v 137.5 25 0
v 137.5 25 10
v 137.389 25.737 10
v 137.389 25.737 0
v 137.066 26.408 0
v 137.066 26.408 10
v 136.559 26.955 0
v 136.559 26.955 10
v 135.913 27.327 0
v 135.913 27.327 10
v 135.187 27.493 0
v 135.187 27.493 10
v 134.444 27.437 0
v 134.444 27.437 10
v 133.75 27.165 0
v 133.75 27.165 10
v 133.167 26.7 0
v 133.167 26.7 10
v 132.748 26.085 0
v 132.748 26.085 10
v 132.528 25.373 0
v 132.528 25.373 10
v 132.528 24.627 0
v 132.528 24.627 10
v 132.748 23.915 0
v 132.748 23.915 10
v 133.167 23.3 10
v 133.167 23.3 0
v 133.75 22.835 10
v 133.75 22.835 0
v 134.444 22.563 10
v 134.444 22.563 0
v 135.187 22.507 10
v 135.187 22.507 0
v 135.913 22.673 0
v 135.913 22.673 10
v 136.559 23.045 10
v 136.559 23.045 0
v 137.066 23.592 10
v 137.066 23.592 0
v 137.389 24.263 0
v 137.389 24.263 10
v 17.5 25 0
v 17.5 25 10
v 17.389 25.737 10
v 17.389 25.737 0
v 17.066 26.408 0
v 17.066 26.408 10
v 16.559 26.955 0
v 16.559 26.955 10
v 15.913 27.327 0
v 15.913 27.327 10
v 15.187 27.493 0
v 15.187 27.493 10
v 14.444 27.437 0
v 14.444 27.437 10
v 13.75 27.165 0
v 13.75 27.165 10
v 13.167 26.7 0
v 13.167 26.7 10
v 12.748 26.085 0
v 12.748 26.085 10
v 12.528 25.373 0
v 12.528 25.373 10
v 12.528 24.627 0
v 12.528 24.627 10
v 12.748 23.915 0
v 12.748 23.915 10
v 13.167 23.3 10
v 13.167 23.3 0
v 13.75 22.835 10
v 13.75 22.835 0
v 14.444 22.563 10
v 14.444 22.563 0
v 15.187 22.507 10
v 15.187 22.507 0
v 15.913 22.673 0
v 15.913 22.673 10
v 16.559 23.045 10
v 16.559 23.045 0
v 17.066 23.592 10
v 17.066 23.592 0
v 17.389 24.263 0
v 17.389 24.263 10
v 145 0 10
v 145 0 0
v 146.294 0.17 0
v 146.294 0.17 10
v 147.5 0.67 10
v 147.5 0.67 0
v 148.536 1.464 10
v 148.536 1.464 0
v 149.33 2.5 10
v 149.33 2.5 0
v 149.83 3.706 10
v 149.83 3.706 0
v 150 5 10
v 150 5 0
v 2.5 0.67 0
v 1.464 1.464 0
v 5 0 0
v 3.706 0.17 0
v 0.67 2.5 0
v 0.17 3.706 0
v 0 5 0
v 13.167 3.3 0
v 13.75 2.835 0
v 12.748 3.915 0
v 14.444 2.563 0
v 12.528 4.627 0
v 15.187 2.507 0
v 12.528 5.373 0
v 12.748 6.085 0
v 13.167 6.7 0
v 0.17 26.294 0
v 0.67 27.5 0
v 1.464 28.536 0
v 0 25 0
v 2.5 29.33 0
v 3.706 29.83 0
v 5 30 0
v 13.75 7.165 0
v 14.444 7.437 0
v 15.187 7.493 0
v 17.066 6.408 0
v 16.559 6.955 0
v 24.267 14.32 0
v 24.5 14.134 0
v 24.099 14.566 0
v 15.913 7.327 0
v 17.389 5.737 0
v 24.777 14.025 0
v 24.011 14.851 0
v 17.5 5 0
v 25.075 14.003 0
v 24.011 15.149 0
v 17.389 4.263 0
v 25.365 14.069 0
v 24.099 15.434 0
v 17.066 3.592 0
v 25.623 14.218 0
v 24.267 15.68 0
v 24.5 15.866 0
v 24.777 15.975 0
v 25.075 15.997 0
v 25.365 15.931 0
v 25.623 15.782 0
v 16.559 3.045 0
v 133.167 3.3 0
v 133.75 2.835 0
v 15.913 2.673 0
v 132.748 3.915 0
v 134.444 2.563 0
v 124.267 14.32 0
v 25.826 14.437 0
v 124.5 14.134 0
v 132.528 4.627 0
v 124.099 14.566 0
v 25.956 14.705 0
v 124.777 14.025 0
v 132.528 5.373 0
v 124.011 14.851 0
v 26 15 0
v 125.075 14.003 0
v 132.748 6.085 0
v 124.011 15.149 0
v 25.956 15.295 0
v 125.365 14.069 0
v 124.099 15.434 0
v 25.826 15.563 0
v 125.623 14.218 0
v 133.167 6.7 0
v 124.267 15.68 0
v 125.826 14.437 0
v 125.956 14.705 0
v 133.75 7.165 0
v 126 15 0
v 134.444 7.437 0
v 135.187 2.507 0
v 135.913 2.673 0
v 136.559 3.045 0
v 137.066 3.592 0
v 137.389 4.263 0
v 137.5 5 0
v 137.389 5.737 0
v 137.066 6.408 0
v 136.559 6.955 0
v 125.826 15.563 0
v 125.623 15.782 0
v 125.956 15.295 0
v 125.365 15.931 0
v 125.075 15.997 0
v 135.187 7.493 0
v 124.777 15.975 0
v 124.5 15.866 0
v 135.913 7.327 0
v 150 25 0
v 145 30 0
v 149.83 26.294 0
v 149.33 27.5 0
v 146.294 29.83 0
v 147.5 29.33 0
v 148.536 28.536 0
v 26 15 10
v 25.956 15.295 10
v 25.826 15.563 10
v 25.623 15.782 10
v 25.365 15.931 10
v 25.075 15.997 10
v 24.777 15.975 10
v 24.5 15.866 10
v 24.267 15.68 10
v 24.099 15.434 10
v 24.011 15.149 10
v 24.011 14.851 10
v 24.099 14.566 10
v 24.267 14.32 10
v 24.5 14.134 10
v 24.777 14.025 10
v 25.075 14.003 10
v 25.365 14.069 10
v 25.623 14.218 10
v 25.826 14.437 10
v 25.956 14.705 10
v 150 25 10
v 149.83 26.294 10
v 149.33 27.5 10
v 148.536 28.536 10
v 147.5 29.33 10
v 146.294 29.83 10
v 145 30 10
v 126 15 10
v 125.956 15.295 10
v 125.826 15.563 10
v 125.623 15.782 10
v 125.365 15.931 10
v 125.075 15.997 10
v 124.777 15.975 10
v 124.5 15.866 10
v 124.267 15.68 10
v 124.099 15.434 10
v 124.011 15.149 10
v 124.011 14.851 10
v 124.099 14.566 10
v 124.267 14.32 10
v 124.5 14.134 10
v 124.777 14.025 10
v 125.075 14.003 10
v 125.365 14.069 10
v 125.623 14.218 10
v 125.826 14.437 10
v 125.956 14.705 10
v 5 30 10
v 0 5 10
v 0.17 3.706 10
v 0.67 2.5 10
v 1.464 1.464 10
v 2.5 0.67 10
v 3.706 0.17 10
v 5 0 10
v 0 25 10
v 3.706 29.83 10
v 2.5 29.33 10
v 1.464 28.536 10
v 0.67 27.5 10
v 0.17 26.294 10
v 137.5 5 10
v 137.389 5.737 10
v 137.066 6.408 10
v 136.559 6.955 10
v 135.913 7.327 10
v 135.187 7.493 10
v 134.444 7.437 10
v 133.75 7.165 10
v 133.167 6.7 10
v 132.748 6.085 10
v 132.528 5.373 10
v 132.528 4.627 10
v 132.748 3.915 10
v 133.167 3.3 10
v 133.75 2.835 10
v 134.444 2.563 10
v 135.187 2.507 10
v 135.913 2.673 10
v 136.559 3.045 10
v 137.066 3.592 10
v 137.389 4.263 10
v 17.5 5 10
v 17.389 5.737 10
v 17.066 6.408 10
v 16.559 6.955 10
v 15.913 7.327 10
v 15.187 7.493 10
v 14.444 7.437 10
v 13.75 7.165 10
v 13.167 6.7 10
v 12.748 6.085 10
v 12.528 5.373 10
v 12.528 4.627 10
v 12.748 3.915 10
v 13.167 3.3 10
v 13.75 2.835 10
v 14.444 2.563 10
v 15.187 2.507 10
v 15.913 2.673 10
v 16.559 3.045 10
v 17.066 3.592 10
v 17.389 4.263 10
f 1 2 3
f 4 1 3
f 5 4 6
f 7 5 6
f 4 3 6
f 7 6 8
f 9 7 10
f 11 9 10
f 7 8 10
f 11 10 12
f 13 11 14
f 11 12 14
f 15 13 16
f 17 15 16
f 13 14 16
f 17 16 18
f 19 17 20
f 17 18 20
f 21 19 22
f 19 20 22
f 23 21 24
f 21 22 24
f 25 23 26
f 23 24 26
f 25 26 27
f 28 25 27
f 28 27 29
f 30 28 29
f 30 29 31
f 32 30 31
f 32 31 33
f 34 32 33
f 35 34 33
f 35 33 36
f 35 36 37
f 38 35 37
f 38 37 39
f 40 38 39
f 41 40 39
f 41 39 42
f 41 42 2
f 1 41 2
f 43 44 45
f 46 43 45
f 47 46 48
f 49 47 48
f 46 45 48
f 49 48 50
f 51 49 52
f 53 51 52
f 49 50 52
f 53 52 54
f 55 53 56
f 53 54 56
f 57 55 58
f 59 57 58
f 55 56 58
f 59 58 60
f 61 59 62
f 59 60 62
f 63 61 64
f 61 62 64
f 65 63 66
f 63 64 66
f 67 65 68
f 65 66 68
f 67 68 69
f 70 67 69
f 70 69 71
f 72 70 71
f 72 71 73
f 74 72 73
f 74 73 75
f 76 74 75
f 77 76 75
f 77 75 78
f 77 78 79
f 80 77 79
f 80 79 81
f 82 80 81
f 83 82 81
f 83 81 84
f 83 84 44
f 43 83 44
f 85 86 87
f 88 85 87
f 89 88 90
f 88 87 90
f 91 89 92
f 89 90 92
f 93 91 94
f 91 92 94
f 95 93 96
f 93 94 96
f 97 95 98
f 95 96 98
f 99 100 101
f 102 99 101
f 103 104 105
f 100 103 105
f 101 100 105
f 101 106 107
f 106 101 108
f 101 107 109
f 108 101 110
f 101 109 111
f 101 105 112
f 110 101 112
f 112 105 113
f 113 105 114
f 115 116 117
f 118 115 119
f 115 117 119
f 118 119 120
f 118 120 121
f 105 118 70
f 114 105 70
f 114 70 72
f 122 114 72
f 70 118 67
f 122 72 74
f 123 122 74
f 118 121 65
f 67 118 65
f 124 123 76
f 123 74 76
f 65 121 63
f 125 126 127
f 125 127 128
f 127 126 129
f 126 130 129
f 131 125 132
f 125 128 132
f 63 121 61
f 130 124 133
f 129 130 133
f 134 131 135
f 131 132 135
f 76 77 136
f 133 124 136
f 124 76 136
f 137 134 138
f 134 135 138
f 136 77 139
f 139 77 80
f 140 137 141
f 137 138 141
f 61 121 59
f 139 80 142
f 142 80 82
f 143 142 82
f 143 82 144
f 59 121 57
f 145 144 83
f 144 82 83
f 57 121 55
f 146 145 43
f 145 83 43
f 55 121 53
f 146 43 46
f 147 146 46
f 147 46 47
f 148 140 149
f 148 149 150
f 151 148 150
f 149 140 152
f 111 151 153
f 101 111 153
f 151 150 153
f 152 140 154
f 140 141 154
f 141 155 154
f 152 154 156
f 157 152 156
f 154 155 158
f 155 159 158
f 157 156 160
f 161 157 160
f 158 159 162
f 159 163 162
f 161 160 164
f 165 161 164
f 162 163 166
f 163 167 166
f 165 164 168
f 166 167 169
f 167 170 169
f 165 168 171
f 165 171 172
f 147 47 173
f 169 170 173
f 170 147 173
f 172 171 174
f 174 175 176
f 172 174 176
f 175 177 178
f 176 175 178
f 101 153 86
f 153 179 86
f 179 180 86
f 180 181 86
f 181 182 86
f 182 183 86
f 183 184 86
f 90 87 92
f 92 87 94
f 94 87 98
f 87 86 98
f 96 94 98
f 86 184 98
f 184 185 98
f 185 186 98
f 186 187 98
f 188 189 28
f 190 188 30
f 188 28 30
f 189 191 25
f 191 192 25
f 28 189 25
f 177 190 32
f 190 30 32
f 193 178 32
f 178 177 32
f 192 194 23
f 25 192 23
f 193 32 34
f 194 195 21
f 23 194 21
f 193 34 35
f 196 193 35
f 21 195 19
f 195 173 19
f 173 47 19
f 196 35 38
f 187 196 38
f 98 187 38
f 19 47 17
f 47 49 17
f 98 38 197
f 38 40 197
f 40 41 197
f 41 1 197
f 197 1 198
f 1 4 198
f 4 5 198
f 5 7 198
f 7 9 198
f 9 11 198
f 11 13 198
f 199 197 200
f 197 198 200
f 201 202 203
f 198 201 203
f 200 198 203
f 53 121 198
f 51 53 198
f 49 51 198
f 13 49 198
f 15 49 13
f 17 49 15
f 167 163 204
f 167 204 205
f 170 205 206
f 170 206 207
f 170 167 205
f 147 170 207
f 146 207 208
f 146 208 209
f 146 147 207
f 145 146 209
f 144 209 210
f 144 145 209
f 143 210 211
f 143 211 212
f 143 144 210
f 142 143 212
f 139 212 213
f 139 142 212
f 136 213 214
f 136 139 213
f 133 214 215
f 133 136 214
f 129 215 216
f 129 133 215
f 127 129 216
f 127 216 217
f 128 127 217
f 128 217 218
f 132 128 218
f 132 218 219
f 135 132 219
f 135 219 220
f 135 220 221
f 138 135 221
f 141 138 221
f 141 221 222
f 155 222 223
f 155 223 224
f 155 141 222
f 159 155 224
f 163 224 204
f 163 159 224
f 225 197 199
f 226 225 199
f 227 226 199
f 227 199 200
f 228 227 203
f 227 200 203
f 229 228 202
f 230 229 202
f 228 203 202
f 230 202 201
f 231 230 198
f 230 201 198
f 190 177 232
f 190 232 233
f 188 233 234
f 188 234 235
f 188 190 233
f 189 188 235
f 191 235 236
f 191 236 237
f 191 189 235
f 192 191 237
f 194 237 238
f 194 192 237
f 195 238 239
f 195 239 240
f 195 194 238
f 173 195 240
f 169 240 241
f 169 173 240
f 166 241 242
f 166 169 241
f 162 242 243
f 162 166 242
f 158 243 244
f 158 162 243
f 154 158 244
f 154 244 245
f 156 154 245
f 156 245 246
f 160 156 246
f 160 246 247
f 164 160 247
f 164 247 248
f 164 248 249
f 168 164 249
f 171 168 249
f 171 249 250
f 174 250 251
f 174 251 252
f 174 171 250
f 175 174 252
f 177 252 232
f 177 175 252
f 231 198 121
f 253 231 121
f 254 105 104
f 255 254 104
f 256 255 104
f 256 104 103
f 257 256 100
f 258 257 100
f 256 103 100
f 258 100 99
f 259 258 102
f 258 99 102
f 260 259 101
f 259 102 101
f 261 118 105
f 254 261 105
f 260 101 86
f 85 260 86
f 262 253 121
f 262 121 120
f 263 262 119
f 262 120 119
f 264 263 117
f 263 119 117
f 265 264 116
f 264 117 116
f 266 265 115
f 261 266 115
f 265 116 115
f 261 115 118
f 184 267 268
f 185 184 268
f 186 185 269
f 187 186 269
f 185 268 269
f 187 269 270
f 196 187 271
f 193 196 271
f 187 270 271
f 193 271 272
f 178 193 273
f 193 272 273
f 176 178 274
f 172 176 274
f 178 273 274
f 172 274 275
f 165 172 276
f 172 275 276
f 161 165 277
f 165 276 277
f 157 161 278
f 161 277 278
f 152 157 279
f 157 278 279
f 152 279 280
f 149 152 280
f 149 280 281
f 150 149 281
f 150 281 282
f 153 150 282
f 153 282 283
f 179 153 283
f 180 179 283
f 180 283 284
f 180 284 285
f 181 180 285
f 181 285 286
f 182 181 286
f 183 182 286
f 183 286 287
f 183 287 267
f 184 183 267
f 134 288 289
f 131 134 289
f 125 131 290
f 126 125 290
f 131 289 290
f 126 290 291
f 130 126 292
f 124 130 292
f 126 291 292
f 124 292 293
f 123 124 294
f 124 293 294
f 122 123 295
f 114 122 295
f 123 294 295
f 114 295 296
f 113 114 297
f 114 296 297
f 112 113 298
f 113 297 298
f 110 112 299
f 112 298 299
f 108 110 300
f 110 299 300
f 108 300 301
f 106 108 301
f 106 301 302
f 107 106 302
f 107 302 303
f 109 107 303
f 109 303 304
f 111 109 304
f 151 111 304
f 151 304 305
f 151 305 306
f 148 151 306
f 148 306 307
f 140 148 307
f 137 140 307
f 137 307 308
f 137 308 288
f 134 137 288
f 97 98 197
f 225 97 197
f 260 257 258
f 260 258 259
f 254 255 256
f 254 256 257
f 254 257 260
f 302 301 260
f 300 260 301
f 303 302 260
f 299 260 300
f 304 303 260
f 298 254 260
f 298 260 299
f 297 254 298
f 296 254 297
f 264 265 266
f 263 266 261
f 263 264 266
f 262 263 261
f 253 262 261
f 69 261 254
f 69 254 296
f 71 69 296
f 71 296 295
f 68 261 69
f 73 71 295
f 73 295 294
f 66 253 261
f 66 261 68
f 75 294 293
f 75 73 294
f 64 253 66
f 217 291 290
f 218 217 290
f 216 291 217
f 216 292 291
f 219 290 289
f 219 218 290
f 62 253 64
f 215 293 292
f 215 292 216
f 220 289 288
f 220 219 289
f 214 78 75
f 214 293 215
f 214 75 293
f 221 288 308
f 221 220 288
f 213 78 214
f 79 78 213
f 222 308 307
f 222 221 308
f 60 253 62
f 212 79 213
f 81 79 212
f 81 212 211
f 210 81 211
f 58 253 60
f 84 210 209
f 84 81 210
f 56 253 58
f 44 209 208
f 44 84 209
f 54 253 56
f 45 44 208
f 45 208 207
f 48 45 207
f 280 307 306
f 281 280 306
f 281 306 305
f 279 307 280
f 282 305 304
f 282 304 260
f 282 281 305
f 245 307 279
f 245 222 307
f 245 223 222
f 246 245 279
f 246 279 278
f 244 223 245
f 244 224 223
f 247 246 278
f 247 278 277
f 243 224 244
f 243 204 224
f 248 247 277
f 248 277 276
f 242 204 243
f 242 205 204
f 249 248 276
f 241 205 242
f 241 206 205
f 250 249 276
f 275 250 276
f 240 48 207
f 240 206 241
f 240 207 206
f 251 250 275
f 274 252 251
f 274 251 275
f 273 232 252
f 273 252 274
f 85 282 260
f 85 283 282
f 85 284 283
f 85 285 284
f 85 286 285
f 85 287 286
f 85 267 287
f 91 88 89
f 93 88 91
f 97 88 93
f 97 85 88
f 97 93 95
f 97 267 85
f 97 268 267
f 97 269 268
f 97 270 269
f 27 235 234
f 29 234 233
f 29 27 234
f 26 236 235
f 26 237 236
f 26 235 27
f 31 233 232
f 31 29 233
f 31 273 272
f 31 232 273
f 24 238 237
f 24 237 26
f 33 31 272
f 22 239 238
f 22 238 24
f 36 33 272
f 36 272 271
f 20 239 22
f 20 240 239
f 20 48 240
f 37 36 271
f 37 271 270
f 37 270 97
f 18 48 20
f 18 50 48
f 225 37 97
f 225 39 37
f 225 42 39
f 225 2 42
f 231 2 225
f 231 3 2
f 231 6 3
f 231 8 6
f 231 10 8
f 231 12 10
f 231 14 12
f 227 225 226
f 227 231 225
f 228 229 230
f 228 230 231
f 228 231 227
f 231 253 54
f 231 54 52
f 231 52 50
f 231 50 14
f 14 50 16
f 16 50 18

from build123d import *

# Parameters (mm, degrees)
SKETCH1_R           = 1
BOSS_EXTRUDE1_DEPTH = 10
SKETCH2_R           = 2.5
CUT_EXTRUDE1_DEPTH  = 11


with BuildPart() as part:
    # Sketch1 → Boss-Extrude1 (new body)
    with BuildSketch(Plane.XY):
        with BuildLine():
            Line((5, 0), (145, 0))
            ThreePointArc((145, 0), (148.535533906, 1.464466094), (150, 5))
            Line((150, 5), (150, 25))
            ThreePointArc((150, 25), (148.535533906, 28.535533906), (145, 30))
            Line((145, 30), (5, 30))
            ThreePointArc((5, 30), (1.464466094, 28.535533906), (0, 25))
            Line((0, 25), (0, 5))
            ThreePointArc((0, 5), (1.464466094, 1.464466094), (5, 0))
        make_face()
        with Locations((25, 15)):
            Circle(SKETCH1_R, mode=Mode.SUBTRACT)
        with Locations((125, 15)):
            Circle(SKETCH1_R, mode=Mode.SUBTRACT)
    extrude(amount=BOSS_EXTRUDE1_DEPTH)

    # Sketch2 → Cut-Extrude1 (cut, through all)
    with BuildSketch(Plane.XY.offset(10)):
        with Locations((15, 25)):
            Circle(SKETCH2_R)
        with Locations((15, 5)):
            Circle(SKETCH2_R)
        with Locations((135, 25)):
            Circle(SKETCH2_R)
        with Locations((135, 5)):
            Circle(SKETCH2_R)
    extrude(amount=-CUT_EXTRUDE1_DEPTH, mode=Mode.SUBTRACT)


solid = part.part
